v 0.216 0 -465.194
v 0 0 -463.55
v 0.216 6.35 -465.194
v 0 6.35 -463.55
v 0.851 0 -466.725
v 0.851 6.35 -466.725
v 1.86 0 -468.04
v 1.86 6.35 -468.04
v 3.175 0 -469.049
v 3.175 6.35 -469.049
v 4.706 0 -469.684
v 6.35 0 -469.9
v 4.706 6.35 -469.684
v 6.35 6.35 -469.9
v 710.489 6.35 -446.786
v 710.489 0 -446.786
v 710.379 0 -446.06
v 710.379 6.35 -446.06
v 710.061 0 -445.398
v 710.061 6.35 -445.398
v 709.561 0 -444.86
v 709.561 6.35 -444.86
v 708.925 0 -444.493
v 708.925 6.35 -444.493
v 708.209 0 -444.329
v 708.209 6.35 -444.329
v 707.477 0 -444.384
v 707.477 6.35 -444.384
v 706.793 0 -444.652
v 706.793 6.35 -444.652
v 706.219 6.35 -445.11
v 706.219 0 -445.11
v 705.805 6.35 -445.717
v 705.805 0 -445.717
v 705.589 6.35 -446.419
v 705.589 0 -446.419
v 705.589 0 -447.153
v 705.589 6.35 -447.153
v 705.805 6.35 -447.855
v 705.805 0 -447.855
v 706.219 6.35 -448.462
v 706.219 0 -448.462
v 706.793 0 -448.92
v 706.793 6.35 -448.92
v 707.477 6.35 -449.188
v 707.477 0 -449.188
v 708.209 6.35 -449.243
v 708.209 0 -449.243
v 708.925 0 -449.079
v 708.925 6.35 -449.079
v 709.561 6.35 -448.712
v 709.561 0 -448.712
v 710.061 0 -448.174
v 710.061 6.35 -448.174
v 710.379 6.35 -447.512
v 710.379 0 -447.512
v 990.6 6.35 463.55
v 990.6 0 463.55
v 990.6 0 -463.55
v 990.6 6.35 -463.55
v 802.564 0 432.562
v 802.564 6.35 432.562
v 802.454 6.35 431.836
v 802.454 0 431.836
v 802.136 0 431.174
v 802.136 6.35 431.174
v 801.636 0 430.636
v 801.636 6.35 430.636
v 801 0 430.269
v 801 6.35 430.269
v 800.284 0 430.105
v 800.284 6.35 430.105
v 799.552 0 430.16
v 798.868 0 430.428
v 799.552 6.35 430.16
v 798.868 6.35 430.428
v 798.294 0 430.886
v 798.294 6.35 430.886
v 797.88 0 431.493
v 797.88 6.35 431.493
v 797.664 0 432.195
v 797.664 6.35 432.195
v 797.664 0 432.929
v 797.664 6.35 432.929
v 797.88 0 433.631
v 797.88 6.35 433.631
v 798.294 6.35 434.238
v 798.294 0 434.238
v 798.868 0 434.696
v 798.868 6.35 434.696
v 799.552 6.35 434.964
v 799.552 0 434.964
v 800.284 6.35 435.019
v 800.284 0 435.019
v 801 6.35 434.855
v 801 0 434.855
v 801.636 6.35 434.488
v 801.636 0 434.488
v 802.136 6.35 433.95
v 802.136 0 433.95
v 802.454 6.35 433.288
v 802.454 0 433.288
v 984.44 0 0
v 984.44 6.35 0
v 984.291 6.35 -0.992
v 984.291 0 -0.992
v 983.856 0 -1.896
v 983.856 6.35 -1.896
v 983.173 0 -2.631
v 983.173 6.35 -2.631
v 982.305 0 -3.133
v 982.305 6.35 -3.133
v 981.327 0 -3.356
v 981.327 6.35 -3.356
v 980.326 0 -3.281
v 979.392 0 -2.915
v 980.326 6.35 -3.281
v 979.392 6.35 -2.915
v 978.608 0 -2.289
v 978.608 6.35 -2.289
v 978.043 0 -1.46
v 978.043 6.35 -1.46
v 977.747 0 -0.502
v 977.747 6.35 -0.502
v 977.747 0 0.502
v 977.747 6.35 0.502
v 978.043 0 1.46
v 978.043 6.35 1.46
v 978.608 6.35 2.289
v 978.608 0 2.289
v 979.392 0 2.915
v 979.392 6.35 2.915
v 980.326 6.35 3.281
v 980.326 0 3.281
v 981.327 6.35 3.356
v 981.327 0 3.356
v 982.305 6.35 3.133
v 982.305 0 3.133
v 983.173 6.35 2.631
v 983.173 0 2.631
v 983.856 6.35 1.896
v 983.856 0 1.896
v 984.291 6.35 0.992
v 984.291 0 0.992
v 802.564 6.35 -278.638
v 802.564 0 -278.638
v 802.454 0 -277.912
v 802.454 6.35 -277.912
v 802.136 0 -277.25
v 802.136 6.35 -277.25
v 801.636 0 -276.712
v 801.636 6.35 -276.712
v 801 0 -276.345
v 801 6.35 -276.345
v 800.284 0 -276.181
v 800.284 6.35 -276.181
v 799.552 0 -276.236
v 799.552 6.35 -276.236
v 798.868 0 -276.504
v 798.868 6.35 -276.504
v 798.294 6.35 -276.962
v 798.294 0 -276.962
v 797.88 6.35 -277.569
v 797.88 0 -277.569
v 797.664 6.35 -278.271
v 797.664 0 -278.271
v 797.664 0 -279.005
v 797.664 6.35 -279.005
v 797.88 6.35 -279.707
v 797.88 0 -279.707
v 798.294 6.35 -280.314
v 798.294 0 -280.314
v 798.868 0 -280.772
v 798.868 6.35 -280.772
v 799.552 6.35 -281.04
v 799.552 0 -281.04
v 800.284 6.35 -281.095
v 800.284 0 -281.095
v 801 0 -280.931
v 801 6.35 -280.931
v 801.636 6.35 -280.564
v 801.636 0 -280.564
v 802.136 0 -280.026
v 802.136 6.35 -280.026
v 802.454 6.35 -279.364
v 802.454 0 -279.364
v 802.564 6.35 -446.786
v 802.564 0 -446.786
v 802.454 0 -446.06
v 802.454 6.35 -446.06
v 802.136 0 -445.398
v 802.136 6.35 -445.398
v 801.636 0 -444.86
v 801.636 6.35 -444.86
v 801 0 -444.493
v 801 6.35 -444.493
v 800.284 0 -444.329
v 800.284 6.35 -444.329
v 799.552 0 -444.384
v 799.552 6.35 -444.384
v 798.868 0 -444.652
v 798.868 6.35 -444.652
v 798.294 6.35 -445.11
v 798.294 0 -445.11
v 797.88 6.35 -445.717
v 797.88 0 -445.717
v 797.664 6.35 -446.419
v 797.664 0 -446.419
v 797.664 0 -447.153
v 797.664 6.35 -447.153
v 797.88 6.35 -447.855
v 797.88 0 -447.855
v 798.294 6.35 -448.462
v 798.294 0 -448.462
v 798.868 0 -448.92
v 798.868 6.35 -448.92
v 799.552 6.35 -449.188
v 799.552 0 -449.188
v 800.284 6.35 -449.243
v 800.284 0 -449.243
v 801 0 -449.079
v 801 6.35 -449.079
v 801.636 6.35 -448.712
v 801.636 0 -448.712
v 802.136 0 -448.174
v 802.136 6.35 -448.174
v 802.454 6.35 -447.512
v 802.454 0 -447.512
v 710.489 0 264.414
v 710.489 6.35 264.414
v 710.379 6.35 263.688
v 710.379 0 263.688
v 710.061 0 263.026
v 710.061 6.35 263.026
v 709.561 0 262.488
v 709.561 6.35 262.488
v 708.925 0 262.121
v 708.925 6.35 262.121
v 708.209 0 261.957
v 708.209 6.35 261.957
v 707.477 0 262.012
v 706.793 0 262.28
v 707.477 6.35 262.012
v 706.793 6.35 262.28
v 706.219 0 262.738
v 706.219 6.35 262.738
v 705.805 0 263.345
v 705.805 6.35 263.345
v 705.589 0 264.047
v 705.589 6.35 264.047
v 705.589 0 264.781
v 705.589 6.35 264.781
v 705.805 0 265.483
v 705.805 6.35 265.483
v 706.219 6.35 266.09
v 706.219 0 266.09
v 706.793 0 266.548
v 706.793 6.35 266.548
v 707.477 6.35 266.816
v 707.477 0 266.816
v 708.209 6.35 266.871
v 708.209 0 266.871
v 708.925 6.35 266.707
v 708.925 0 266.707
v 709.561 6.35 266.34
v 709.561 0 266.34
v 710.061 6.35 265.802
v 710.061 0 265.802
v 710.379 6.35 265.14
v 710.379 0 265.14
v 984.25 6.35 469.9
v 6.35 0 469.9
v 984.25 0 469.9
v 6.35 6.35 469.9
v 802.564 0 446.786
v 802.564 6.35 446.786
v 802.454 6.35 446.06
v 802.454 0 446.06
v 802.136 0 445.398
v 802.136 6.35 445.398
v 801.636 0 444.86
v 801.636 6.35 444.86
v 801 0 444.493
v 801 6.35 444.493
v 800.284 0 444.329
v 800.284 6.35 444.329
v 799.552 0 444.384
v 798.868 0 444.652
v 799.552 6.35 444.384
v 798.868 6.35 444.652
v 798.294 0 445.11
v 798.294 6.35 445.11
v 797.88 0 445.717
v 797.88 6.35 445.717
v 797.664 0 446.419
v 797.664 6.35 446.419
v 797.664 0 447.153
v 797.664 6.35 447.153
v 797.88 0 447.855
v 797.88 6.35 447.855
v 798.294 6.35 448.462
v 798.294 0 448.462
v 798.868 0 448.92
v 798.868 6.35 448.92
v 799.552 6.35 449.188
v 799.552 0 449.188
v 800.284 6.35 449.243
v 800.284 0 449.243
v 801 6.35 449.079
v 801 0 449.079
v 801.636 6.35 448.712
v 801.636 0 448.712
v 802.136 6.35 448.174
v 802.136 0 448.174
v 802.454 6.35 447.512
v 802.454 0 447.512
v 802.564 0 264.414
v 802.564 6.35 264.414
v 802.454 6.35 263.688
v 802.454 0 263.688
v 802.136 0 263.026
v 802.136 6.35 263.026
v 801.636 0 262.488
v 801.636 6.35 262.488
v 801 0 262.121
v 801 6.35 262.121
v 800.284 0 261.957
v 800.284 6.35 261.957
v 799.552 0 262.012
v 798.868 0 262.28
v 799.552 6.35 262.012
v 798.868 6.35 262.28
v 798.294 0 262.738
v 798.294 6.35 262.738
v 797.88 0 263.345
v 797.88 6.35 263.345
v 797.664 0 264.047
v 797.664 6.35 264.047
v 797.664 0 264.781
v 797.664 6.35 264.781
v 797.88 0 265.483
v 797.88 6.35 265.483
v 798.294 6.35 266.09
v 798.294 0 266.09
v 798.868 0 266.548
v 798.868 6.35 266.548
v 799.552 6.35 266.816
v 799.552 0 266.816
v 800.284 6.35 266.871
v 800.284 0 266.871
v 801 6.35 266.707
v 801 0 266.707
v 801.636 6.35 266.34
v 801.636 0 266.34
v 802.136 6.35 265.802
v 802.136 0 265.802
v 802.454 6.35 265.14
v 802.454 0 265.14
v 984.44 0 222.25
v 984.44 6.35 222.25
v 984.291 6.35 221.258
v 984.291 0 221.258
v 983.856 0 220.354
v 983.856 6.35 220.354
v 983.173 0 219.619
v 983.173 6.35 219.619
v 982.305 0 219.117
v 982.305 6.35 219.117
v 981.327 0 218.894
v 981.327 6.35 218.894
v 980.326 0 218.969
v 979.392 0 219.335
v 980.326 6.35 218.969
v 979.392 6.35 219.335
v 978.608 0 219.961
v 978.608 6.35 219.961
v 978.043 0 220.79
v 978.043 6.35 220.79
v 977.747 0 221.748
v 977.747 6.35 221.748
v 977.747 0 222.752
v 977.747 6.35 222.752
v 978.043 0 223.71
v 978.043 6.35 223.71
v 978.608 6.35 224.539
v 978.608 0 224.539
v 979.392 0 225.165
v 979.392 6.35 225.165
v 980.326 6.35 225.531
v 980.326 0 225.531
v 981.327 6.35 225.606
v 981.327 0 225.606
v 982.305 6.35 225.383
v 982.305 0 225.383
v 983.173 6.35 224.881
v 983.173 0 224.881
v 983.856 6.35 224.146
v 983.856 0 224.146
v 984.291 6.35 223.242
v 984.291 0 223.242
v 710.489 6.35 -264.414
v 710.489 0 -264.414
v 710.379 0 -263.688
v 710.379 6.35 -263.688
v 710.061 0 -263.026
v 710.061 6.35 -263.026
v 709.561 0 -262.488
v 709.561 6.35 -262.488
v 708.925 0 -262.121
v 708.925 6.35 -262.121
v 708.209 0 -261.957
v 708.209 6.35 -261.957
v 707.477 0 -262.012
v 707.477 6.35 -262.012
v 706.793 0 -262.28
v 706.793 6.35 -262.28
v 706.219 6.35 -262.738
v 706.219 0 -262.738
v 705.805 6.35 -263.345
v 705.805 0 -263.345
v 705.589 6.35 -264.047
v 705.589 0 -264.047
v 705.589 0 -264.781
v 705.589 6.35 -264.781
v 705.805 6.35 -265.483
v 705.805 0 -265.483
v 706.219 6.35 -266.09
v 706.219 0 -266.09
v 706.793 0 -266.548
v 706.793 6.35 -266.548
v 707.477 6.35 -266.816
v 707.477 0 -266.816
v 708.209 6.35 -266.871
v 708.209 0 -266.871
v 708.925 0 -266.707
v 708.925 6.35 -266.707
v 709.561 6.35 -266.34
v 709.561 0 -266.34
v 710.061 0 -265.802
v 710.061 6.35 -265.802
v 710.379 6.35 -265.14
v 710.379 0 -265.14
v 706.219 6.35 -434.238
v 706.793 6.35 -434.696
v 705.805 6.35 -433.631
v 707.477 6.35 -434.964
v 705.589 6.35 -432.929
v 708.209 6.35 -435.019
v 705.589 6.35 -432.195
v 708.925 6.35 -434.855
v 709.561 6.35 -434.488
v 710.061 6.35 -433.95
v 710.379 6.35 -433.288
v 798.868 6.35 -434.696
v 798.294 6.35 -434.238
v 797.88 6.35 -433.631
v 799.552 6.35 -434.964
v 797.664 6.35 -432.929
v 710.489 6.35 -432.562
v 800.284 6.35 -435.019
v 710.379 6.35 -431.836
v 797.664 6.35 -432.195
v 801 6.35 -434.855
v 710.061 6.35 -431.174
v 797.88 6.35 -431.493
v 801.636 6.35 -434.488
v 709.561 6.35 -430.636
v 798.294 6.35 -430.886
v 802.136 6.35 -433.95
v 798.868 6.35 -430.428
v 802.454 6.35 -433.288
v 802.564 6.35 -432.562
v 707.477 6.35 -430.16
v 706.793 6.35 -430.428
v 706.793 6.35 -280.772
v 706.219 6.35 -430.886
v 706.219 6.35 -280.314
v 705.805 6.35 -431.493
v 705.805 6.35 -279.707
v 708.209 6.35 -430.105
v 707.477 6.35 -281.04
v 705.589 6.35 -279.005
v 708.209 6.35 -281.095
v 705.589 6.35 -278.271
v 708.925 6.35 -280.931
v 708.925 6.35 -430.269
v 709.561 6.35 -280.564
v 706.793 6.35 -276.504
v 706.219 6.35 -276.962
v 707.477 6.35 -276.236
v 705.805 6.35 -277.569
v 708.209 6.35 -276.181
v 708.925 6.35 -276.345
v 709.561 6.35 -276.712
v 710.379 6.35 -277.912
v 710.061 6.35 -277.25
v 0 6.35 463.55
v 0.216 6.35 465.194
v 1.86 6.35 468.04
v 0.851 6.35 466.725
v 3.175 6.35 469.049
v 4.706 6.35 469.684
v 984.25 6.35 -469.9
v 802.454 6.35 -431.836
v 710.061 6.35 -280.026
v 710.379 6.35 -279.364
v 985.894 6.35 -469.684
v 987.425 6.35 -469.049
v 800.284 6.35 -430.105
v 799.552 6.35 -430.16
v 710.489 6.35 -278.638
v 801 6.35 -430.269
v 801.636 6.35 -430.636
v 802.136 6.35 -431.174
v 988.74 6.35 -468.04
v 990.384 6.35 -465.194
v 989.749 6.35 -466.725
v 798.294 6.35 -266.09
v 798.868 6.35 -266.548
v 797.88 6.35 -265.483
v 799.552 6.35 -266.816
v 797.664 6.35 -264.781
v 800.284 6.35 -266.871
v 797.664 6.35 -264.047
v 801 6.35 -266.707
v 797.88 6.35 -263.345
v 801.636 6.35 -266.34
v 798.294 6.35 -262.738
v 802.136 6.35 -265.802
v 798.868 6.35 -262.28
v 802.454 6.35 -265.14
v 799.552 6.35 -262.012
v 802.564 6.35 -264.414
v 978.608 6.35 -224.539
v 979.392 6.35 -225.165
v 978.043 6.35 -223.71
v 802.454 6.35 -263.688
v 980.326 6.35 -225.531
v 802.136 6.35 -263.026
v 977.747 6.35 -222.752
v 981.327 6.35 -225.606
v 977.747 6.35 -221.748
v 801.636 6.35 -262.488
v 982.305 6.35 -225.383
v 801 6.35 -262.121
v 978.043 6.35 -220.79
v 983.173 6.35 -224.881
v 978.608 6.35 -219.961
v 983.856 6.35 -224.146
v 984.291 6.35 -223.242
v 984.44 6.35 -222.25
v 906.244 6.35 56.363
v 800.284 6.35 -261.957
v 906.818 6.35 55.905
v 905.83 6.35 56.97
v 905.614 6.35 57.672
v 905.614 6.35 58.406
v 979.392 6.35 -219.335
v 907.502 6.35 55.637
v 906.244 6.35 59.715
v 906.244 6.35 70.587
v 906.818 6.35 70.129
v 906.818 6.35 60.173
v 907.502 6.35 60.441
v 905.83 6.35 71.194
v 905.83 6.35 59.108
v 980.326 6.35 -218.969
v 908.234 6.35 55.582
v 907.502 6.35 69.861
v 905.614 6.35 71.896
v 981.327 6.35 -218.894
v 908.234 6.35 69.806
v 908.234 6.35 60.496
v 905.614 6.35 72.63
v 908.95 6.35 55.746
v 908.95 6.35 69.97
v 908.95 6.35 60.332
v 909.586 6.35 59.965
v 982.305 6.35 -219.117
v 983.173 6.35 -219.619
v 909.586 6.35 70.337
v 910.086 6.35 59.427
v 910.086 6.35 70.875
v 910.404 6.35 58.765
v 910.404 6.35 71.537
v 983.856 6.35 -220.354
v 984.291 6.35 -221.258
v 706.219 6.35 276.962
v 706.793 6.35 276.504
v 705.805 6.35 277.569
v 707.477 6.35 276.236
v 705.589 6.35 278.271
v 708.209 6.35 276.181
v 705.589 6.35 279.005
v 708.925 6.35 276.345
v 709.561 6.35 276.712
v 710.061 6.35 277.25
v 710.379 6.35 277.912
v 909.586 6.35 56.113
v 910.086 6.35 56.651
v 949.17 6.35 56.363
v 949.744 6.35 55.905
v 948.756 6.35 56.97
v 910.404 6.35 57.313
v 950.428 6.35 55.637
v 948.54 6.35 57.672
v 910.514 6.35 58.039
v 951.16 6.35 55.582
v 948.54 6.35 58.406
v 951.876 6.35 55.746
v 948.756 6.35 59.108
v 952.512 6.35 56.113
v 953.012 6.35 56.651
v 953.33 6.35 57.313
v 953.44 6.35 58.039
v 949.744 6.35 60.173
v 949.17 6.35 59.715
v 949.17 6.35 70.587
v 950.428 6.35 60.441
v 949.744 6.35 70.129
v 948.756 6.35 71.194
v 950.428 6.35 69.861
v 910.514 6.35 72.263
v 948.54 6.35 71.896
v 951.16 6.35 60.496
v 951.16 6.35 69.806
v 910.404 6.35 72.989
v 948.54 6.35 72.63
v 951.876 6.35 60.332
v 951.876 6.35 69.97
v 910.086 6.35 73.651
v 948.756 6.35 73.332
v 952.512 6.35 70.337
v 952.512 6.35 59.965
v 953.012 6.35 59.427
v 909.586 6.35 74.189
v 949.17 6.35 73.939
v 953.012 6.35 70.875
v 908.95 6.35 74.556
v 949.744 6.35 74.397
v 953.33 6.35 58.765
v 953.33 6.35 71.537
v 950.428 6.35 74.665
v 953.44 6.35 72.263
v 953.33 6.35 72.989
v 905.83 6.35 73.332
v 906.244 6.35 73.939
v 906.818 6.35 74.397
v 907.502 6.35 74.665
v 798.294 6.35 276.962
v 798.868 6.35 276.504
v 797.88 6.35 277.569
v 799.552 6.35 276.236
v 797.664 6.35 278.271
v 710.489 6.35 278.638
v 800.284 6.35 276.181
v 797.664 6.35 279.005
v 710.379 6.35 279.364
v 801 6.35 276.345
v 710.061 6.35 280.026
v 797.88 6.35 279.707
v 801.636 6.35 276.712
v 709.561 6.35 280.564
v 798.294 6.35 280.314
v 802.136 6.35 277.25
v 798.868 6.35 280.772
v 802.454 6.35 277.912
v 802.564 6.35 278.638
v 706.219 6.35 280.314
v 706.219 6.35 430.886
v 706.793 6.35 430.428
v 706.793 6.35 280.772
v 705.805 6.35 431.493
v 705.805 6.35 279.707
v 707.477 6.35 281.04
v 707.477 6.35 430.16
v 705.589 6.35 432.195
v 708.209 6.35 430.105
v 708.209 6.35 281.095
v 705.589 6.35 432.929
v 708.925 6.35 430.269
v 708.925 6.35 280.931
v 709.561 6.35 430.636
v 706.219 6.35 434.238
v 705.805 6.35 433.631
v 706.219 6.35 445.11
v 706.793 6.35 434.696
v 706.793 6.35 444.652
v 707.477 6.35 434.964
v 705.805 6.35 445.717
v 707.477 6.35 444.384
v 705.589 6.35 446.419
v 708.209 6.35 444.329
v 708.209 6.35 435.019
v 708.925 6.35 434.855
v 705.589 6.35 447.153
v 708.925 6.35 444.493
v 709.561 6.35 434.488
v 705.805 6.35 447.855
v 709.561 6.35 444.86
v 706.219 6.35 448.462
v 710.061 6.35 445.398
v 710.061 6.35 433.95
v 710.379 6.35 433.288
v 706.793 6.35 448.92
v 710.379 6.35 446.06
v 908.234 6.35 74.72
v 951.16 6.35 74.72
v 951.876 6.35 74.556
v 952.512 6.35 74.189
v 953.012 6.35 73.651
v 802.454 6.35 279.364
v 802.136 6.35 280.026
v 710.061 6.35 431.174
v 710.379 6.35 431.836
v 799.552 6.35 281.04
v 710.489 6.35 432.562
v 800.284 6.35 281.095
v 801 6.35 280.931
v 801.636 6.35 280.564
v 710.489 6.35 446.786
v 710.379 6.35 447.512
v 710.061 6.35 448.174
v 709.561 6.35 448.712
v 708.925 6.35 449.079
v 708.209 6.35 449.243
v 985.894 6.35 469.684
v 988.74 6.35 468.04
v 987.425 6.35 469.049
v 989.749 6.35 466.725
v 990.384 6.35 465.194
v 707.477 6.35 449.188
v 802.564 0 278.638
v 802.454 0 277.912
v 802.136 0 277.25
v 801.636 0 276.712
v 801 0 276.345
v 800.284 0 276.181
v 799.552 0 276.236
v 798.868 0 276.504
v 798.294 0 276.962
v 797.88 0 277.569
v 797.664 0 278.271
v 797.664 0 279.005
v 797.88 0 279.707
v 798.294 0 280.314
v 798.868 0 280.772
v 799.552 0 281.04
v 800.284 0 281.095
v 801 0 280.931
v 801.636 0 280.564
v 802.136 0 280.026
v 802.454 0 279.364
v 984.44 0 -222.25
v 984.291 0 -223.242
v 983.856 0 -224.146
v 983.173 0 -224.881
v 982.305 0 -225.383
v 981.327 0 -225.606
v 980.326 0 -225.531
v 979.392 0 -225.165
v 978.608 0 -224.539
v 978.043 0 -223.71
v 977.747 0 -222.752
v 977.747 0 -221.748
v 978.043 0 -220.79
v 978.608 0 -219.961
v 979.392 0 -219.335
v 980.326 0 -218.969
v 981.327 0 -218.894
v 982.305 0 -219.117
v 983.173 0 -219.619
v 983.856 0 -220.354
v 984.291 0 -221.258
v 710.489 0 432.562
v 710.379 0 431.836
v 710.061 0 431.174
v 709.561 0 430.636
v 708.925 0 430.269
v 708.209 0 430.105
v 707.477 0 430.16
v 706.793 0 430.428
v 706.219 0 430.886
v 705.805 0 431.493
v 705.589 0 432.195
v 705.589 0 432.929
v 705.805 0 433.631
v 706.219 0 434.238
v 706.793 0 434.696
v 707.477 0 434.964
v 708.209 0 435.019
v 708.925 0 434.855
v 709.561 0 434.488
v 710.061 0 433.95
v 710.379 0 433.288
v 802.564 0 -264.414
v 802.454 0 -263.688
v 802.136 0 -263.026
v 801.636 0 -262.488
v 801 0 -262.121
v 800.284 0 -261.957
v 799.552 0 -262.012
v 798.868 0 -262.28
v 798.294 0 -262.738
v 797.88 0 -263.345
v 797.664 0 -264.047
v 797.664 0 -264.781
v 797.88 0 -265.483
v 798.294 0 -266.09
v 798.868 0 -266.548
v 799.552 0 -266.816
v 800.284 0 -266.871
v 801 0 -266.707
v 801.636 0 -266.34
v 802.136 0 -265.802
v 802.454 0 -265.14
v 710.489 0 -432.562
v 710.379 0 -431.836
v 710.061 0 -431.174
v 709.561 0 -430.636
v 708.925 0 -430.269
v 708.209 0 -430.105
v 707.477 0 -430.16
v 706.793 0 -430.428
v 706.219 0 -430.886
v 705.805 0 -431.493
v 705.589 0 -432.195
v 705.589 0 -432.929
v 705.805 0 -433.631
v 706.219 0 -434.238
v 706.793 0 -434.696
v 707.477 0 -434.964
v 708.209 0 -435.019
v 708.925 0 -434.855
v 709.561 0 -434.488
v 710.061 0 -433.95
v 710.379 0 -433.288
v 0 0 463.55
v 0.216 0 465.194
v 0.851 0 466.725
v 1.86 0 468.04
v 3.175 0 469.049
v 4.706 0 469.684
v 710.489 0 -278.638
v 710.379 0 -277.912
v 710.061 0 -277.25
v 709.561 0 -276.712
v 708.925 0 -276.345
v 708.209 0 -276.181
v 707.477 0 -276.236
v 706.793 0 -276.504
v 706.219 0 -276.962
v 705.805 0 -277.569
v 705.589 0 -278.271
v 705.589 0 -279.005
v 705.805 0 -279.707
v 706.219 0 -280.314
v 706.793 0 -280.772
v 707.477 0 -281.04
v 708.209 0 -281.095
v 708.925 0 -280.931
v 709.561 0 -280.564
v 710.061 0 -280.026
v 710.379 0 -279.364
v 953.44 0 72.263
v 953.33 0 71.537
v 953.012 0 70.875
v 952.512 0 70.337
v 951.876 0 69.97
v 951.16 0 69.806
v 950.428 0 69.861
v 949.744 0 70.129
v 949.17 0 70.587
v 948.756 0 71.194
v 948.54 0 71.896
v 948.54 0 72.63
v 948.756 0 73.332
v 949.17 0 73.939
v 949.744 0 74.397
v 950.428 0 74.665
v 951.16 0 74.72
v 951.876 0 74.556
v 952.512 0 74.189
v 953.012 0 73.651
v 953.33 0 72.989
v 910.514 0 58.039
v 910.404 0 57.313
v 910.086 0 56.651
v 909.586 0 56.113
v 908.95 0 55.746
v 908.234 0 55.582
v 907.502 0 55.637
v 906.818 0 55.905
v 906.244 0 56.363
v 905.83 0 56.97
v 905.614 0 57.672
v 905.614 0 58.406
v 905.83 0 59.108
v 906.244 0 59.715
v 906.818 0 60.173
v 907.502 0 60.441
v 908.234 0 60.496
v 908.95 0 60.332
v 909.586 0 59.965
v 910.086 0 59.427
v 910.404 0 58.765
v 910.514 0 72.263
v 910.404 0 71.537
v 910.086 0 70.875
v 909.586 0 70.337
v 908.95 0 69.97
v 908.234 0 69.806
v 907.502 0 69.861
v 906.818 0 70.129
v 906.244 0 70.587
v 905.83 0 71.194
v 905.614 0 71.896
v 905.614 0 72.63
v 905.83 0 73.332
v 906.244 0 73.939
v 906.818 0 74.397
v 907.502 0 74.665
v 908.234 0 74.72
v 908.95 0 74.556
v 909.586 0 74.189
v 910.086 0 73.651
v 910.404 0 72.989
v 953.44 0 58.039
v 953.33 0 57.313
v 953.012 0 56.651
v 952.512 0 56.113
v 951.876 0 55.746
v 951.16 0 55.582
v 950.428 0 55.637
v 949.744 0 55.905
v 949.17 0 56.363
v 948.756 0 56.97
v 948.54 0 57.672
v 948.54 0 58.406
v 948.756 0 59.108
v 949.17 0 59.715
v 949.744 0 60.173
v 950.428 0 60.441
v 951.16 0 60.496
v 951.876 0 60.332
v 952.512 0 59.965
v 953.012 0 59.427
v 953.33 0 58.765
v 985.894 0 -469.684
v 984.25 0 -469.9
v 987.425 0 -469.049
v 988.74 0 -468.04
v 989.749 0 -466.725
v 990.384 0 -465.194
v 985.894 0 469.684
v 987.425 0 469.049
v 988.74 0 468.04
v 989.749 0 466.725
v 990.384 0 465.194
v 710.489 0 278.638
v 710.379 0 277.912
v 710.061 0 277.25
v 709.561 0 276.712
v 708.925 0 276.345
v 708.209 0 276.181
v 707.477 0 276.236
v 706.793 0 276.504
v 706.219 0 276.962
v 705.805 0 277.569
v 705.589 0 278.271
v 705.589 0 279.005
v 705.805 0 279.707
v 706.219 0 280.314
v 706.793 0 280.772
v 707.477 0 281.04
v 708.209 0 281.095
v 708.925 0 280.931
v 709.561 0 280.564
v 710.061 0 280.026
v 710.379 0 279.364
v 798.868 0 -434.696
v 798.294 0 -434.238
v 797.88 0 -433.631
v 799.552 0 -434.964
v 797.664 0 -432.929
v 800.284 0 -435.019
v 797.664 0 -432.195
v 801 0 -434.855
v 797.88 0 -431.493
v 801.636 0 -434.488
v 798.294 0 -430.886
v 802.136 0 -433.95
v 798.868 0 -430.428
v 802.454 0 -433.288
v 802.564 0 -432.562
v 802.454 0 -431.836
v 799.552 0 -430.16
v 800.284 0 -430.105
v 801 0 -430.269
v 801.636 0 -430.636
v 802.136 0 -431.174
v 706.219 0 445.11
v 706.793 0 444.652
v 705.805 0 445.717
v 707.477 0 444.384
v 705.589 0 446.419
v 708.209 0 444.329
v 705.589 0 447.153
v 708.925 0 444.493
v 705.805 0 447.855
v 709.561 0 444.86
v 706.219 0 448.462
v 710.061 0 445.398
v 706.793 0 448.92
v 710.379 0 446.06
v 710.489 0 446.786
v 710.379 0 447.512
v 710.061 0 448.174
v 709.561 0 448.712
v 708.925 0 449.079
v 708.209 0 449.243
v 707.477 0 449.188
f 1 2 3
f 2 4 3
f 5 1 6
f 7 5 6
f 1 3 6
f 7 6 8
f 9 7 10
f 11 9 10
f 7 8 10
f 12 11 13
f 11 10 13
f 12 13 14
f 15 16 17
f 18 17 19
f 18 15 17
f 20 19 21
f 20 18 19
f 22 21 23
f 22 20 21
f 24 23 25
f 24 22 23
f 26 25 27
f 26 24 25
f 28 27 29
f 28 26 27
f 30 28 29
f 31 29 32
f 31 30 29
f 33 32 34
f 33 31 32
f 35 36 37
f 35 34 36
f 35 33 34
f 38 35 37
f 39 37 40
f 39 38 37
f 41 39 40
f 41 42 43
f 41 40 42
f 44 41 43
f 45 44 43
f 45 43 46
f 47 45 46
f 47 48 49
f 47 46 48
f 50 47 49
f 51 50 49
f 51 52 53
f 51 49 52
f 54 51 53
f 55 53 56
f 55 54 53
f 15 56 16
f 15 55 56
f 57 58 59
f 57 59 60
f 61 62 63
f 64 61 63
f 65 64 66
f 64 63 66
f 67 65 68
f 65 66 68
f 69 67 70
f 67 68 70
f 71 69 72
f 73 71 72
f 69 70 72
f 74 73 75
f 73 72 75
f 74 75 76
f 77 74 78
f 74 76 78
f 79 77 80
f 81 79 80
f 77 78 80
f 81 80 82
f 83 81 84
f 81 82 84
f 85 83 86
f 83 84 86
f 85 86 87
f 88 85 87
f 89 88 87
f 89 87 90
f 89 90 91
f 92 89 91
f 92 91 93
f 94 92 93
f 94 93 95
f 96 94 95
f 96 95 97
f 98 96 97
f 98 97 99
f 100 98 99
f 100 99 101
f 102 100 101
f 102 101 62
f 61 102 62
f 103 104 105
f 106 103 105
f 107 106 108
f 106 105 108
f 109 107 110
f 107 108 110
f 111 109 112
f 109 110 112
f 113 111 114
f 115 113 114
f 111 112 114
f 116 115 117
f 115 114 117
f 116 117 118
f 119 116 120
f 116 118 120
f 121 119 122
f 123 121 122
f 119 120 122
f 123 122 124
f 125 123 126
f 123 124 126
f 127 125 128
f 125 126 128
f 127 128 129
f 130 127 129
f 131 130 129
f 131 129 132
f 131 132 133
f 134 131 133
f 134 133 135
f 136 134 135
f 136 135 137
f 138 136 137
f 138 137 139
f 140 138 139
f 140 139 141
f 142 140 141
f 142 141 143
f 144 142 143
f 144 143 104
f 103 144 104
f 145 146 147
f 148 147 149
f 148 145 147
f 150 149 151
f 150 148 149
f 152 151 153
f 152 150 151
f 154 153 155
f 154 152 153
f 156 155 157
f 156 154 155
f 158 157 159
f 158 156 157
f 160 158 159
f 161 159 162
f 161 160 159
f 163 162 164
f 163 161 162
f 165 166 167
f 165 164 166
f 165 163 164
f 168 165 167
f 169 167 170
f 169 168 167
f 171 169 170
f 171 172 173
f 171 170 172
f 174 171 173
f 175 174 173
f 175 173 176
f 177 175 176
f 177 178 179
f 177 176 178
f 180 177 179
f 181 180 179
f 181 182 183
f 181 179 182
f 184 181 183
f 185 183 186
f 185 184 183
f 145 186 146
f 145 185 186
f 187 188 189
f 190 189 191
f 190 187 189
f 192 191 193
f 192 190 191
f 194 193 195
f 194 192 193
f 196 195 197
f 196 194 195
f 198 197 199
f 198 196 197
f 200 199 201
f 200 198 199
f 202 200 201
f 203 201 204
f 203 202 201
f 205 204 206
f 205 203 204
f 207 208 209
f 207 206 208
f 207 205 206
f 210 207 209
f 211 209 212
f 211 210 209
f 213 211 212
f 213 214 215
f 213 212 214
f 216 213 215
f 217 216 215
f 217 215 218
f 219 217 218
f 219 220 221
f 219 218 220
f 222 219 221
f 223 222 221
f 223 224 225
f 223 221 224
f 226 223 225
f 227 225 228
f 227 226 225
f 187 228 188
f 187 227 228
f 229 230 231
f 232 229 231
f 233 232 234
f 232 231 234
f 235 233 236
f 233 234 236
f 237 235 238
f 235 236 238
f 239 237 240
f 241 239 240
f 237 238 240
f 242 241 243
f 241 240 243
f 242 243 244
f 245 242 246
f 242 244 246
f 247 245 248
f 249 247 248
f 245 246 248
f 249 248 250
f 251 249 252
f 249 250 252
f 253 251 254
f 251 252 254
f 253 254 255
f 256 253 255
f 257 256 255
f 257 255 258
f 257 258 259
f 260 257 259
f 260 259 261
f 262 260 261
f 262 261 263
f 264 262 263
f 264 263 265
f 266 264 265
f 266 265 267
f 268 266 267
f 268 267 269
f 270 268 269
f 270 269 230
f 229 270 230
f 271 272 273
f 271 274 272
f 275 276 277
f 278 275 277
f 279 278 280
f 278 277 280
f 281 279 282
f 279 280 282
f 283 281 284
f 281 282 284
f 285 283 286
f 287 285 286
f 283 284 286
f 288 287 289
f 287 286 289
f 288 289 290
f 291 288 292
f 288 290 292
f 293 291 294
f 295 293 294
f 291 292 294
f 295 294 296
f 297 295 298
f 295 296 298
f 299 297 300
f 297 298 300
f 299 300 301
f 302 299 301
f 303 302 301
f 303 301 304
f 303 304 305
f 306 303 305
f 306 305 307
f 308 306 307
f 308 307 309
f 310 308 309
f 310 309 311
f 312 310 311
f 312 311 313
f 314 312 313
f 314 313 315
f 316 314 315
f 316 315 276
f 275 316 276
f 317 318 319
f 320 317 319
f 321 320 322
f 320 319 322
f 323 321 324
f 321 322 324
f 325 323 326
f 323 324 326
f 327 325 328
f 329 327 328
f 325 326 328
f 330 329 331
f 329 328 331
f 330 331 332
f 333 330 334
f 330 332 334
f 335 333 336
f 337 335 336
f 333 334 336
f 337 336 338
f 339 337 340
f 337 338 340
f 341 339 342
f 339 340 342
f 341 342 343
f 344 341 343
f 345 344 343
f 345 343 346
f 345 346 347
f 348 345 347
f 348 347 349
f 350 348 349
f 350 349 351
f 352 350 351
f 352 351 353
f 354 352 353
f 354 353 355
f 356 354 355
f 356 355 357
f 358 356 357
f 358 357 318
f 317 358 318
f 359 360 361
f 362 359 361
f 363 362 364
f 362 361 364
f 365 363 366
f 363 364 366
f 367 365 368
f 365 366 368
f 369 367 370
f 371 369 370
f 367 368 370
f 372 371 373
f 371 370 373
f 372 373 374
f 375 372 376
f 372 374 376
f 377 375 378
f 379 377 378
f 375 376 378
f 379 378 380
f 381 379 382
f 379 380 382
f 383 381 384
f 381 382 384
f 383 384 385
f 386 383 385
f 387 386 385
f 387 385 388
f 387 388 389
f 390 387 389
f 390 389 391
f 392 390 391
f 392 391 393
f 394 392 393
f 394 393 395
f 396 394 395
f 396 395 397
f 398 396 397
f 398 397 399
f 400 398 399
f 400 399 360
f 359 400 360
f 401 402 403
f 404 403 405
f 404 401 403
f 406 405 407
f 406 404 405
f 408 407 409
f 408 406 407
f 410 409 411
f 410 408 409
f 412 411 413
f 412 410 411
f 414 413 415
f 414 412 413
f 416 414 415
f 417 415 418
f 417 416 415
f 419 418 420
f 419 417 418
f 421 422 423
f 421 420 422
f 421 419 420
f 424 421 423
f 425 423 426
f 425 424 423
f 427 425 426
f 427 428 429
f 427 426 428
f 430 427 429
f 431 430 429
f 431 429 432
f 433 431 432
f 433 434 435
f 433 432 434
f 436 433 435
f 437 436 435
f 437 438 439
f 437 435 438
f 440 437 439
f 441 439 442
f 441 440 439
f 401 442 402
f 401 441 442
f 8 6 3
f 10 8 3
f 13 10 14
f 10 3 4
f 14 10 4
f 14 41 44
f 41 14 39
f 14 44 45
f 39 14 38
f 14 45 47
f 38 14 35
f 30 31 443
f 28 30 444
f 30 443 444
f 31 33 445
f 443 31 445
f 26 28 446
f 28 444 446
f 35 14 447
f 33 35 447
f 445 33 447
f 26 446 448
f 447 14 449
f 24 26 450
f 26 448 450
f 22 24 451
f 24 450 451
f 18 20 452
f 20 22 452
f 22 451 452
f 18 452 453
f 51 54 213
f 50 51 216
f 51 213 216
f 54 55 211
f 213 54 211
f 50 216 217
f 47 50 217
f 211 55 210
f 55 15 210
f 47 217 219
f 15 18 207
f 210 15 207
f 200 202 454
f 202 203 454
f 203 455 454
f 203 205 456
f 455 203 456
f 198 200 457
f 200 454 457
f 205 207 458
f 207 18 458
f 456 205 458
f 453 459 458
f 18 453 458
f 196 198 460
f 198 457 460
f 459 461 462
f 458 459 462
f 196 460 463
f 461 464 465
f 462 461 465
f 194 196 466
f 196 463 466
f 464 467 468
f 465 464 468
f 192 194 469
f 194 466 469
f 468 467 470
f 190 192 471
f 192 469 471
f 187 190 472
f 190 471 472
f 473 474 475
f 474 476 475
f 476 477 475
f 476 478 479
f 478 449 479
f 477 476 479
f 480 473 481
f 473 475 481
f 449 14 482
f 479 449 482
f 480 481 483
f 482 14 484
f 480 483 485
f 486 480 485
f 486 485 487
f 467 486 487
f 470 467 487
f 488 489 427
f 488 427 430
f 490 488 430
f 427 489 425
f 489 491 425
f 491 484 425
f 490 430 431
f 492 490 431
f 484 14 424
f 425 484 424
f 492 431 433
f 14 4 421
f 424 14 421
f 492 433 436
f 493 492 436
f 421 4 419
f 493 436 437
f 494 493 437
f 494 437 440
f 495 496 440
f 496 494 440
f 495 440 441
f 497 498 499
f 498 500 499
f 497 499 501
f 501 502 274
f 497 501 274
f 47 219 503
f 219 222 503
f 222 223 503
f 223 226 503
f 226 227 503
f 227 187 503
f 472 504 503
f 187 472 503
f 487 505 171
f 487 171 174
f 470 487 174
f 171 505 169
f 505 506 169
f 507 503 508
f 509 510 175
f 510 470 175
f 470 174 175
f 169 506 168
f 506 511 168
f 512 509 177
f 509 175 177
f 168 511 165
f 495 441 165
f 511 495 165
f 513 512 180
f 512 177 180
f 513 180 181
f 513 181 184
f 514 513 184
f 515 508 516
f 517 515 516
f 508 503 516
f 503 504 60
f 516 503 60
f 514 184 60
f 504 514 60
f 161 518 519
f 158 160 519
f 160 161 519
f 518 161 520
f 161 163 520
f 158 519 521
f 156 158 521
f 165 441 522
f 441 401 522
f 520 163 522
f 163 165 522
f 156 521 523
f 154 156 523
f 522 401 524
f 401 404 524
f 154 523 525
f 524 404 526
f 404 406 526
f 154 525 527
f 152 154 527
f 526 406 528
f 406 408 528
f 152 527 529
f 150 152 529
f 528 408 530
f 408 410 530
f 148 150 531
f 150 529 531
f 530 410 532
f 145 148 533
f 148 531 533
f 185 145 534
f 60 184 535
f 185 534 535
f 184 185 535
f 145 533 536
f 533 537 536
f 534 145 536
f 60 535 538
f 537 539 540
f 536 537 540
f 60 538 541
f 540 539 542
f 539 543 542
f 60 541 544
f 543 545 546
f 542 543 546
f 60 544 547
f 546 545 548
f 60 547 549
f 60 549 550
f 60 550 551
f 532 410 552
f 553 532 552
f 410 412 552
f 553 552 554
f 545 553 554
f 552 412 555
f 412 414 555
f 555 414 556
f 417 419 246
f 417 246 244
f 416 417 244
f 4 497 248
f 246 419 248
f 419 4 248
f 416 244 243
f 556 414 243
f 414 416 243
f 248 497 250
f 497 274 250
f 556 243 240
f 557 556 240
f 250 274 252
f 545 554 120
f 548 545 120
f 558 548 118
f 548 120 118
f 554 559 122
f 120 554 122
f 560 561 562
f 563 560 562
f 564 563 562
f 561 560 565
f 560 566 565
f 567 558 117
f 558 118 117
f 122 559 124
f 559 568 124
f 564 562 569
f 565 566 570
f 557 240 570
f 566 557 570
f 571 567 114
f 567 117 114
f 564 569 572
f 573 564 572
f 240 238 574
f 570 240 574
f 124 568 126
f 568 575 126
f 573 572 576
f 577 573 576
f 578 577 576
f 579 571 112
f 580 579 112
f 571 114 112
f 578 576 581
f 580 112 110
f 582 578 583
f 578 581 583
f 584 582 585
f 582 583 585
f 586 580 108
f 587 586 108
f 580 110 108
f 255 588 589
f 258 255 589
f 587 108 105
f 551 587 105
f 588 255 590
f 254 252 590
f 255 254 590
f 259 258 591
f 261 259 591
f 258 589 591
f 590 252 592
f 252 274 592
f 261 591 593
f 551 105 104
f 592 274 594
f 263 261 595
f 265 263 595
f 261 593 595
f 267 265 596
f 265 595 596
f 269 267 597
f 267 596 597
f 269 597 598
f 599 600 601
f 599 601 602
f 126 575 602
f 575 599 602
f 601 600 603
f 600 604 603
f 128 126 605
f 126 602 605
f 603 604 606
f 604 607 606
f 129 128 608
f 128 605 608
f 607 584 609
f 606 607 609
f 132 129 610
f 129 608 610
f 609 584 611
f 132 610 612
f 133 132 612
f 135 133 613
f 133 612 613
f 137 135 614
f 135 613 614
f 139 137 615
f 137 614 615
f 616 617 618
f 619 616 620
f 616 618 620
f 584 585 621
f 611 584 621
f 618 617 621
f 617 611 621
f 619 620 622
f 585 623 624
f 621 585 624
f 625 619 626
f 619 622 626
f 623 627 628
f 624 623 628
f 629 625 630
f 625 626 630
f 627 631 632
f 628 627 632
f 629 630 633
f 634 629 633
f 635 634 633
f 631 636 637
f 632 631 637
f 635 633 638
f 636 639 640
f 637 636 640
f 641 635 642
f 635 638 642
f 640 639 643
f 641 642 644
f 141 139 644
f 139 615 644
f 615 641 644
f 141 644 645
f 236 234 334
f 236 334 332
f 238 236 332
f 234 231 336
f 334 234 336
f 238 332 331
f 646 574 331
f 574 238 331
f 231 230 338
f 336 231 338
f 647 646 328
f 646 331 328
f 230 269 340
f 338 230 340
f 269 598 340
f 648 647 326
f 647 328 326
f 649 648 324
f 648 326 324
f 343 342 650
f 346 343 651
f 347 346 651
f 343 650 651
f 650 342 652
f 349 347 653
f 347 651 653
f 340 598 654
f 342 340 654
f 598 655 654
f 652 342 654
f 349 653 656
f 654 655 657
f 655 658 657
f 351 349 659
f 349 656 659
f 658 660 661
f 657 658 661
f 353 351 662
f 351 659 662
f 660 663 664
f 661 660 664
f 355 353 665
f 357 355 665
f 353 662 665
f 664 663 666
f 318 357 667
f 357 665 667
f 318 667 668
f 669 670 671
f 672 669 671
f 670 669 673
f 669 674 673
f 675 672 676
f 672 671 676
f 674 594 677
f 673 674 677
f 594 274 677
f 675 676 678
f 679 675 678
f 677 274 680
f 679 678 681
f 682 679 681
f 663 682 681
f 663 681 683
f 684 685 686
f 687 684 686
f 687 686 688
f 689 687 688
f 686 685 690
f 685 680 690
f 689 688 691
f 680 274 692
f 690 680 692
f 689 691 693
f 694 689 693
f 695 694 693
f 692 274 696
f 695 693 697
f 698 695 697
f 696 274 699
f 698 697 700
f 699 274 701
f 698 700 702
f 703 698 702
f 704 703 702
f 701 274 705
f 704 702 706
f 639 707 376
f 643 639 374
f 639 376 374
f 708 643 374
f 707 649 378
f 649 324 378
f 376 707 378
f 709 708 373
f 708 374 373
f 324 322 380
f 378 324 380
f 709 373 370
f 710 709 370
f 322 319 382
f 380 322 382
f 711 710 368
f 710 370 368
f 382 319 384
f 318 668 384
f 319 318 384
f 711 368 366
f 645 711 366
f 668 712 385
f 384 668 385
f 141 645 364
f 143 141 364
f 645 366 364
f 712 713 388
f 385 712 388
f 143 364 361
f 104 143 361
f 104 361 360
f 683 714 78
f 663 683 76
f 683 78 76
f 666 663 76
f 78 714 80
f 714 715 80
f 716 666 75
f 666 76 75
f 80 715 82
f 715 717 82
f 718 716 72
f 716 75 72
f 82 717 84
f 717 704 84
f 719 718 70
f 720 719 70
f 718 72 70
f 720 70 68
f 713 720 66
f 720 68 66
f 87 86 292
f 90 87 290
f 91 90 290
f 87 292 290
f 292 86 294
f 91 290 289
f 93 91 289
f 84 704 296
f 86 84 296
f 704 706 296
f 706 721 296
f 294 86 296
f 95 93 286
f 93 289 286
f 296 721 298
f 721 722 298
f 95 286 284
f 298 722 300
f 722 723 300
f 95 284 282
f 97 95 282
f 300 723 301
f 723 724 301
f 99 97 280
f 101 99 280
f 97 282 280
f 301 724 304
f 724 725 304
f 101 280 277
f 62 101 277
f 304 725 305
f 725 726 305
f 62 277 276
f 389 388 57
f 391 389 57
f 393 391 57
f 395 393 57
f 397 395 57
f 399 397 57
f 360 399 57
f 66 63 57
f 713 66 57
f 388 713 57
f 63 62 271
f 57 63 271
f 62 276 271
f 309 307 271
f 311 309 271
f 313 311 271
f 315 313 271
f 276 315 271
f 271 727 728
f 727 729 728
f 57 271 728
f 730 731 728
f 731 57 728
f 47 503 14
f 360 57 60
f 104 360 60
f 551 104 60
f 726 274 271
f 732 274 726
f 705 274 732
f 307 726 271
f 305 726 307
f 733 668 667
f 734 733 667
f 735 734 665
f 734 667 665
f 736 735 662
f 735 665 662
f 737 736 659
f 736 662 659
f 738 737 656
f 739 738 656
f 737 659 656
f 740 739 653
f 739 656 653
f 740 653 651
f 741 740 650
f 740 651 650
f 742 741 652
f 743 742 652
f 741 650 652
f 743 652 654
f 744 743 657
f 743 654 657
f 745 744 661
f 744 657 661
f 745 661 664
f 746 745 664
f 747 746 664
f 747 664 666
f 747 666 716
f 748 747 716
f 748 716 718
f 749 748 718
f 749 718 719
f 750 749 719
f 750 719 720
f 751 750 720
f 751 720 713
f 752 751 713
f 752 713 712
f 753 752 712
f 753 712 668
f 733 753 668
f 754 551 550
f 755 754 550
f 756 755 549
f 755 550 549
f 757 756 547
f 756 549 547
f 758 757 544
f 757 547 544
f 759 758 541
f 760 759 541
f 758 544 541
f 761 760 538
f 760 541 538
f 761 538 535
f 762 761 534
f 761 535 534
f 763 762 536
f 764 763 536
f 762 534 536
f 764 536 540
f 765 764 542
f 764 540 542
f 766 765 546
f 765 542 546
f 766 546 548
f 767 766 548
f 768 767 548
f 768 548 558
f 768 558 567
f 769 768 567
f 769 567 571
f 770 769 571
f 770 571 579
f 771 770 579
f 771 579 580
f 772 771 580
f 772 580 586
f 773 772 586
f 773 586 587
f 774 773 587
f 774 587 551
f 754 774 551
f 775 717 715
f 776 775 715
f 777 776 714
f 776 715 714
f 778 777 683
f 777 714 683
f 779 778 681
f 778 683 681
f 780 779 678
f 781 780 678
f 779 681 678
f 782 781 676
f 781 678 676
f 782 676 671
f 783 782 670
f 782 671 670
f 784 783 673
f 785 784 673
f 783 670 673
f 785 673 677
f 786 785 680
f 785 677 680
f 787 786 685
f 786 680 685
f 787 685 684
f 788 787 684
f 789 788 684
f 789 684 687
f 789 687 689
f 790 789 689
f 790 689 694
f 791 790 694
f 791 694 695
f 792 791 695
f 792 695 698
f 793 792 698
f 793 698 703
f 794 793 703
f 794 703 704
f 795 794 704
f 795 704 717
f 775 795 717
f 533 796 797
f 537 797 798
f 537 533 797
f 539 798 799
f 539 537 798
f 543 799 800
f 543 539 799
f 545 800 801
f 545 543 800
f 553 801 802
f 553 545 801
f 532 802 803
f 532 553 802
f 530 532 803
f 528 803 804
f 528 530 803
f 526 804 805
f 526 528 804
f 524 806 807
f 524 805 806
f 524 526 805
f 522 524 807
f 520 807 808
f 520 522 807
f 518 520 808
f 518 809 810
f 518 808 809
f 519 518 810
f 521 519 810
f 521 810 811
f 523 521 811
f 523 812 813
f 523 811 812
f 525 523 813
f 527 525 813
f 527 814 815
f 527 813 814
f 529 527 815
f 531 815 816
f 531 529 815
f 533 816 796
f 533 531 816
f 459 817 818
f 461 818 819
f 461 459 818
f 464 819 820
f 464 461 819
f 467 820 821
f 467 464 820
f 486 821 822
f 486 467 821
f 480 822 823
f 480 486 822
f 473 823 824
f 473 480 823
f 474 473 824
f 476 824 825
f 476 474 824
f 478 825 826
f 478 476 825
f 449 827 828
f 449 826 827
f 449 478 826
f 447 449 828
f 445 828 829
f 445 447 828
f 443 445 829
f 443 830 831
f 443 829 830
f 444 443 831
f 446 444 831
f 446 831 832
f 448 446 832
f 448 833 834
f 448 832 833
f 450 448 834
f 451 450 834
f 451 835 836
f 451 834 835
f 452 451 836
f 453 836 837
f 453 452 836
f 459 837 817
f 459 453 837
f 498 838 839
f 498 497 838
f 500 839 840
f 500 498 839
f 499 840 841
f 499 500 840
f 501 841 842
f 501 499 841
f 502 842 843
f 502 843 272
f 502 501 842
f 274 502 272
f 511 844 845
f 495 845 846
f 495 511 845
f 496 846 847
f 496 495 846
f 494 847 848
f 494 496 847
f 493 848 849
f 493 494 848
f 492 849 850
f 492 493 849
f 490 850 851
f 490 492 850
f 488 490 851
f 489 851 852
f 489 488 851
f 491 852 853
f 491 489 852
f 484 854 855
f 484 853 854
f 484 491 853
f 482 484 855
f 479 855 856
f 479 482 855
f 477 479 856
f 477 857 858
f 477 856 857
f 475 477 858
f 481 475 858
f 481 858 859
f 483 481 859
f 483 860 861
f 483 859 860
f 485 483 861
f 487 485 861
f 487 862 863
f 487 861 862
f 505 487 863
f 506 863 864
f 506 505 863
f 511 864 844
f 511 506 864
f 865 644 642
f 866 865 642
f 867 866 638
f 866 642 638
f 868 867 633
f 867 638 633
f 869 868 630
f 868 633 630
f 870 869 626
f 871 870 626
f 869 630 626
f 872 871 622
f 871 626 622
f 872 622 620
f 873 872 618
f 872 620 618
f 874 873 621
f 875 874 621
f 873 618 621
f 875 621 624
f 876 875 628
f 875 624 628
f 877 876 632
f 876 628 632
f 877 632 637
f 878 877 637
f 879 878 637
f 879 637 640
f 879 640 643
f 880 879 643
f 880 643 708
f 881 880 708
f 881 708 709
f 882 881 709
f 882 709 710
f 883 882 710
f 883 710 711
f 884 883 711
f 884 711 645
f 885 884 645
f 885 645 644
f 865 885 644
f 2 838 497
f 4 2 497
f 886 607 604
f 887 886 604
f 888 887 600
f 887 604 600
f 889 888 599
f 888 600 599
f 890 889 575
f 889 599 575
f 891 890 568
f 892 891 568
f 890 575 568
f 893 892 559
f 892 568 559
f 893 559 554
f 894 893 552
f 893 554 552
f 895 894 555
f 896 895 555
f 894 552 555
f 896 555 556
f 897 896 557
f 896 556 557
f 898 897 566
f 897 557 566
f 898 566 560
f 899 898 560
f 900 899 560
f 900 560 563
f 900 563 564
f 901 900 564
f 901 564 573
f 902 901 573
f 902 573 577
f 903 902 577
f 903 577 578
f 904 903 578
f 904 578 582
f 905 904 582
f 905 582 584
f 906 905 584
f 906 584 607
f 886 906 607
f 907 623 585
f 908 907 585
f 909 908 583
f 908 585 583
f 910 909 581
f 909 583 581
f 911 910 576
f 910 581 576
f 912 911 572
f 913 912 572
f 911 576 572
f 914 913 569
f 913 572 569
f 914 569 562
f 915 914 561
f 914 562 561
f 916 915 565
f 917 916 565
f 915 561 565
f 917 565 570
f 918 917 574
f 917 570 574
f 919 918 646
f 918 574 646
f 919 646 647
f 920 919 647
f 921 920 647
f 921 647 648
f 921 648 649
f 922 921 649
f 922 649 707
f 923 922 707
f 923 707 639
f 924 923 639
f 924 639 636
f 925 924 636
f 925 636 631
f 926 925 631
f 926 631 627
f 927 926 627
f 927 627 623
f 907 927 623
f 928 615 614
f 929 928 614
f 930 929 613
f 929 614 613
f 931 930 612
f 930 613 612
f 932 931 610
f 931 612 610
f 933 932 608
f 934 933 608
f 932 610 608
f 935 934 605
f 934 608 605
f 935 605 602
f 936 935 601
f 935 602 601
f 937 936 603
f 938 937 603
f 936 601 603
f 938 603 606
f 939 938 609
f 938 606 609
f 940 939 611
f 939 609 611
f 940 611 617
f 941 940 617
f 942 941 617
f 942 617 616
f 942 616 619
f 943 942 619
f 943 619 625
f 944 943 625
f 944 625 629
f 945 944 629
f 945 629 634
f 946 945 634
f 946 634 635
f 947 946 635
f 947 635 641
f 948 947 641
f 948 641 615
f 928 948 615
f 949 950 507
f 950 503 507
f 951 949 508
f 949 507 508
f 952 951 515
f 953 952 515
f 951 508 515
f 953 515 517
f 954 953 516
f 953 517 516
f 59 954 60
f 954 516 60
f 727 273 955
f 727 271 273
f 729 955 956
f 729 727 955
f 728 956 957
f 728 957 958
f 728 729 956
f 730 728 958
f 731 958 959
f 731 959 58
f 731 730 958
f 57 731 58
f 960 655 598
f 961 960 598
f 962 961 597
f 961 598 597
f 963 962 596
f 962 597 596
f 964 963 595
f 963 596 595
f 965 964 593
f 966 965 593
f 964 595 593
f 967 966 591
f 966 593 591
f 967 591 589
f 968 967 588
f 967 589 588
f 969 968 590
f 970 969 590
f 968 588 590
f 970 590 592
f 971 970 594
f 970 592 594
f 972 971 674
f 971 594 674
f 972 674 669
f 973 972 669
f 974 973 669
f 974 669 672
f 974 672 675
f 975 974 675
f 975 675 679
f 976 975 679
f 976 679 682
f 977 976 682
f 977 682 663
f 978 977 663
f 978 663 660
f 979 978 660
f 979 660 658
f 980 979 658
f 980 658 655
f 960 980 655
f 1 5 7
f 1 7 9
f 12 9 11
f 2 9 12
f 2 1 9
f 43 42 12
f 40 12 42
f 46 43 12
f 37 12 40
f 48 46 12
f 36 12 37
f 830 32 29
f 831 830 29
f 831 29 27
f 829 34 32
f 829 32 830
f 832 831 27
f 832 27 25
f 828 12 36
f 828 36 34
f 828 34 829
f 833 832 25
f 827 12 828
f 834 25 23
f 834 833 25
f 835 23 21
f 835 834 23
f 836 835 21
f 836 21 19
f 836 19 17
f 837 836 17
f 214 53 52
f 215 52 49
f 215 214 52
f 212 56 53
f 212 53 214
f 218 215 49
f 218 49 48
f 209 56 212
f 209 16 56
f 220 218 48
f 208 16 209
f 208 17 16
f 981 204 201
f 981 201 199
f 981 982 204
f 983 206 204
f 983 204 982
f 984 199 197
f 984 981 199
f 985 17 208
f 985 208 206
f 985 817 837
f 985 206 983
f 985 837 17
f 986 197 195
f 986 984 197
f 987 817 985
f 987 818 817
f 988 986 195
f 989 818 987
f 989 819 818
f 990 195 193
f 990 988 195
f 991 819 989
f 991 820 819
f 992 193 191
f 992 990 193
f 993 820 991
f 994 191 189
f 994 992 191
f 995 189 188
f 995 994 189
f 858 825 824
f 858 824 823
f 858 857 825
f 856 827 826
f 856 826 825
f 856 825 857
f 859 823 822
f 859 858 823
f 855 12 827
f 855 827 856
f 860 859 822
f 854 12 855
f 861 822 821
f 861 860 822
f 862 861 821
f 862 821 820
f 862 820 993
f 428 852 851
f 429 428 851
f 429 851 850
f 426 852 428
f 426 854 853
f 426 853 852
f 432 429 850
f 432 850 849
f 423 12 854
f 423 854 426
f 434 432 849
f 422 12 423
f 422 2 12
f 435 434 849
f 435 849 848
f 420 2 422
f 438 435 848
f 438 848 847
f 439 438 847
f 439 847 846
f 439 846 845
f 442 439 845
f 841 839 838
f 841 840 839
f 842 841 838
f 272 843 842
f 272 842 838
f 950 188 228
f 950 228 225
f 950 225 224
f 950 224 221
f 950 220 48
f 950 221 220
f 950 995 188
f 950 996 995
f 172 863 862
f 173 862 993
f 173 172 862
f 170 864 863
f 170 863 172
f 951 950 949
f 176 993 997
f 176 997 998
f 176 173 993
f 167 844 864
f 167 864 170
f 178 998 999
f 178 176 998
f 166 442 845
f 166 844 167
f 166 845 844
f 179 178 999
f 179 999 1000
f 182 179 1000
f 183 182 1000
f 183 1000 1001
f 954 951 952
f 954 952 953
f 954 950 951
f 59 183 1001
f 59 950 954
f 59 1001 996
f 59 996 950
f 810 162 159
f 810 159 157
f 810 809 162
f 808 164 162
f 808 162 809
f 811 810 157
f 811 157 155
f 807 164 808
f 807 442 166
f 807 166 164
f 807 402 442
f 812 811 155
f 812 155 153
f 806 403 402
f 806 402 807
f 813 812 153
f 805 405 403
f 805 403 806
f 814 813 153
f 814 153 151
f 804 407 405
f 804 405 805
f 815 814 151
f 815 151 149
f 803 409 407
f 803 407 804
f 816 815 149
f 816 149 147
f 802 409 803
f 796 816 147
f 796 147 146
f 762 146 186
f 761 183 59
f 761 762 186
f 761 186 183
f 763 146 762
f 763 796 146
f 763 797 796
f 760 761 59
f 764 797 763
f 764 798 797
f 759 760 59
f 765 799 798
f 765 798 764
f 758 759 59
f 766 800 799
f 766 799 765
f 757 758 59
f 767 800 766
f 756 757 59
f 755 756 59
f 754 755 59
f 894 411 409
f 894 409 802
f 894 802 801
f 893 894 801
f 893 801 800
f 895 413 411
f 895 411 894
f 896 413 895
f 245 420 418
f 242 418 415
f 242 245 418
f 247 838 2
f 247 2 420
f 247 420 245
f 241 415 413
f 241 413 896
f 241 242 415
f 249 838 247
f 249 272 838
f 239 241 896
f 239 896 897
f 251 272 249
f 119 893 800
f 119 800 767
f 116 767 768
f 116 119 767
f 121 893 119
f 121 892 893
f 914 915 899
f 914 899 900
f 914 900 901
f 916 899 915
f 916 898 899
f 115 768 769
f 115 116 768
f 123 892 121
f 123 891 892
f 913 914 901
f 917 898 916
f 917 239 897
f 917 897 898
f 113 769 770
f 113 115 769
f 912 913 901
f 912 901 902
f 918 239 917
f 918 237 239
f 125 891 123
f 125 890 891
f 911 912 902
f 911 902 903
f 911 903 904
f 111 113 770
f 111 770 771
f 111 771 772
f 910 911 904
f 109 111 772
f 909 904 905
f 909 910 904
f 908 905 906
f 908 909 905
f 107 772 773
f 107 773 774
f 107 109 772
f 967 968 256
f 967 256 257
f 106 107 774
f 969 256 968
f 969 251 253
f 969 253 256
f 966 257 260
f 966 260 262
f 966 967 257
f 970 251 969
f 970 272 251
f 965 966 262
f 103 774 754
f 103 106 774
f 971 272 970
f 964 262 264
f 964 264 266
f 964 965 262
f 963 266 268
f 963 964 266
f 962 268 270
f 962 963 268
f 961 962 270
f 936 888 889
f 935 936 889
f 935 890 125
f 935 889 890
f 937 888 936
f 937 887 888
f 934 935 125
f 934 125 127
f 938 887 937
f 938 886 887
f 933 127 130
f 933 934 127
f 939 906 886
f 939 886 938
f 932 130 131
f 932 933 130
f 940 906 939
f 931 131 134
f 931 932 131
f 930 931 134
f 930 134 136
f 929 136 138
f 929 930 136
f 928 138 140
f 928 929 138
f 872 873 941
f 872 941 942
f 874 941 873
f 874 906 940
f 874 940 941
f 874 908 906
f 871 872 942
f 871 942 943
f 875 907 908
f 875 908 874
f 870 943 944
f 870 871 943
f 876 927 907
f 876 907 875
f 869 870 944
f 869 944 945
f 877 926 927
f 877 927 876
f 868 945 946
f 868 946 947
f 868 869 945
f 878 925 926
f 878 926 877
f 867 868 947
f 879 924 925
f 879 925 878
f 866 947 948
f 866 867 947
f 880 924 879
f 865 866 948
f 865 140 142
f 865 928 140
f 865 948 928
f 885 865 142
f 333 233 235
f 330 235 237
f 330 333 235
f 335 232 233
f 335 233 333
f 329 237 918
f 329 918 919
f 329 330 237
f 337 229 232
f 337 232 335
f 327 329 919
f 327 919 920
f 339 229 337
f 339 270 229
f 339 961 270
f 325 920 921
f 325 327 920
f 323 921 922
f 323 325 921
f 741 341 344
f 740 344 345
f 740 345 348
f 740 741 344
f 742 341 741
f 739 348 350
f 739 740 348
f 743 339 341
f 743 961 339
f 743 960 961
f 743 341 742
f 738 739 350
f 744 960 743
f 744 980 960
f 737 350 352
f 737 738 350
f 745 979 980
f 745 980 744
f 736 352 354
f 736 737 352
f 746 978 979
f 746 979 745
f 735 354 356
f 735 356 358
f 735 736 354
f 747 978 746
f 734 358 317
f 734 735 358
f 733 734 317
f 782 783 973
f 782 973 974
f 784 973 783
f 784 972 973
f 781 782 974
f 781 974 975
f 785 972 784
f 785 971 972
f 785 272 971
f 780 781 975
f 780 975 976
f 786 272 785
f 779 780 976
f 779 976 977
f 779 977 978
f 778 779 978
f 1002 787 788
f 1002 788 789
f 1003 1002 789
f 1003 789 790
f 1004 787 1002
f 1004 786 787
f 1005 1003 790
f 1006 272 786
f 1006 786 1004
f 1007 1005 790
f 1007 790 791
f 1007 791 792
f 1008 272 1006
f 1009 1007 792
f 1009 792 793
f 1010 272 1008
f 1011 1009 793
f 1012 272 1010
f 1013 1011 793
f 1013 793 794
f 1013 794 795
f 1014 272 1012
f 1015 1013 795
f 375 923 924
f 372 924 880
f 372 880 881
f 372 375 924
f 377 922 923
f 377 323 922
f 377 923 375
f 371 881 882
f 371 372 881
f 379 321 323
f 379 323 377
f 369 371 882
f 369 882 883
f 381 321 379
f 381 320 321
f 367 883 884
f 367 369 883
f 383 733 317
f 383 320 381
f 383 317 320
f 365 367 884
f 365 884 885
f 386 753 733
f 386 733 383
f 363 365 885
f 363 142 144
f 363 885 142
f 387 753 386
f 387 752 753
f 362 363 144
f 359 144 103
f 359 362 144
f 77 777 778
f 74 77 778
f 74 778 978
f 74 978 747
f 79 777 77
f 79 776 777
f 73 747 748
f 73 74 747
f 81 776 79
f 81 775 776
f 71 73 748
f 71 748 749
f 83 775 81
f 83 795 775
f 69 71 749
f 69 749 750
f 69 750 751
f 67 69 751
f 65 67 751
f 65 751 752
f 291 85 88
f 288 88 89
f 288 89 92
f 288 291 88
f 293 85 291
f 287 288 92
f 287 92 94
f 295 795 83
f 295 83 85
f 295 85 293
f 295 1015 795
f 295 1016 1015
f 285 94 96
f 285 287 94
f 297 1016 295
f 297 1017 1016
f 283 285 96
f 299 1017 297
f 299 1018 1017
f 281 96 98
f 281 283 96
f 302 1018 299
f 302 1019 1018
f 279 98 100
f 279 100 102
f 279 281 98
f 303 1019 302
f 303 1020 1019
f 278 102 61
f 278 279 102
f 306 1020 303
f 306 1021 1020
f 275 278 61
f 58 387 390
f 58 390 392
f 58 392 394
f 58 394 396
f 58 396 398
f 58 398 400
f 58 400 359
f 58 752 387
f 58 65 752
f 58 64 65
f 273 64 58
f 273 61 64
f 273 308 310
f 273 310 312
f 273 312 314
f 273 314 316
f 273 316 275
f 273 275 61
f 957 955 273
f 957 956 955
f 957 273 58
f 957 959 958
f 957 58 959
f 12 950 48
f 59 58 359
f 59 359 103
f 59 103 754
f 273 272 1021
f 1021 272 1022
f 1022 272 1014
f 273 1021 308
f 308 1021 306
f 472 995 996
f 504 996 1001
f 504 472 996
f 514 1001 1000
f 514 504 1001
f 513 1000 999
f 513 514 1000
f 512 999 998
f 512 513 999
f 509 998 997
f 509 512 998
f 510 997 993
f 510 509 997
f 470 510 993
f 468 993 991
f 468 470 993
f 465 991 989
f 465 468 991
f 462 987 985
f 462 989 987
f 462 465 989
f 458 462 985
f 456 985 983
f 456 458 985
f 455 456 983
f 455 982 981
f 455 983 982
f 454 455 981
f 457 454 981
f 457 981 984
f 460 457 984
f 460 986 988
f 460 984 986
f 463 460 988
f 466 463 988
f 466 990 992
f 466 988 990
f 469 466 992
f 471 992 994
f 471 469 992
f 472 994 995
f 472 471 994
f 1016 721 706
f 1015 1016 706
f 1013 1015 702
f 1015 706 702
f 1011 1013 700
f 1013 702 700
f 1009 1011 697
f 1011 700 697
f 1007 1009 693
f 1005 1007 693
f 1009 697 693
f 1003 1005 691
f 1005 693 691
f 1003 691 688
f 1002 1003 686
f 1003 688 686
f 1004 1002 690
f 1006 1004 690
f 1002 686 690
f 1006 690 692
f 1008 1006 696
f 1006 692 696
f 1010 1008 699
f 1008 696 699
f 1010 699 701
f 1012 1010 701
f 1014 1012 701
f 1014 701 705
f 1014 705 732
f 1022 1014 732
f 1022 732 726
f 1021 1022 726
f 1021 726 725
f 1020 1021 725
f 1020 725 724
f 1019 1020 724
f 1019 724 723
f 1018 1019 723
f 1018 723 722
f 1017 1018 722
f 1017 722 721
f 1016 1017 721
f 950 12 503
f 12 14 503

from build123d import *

# Parameters (mm, degrees)
SKETCH1_W           = 990.6
SKETCH1_H           = 6.35
BOSS_EXTRUDE1_DEPTH = 469.9
SKETCH2_R           = 2.4638
CUT_EXTRUDE1_DEPTH  = 7.35
SKETCH3_R           = 2.4638
CUT_EXTRUDE2_DEPTH  = 7.35
SKETCH4_R           = 3.3655
CUT_EXTRUDE3_DEPTH  = 7.35
FILLET1_R           = 6.35


with BuildPart() as part:
    # Sketch1 → Boss-Extrude1 (new body, symmetric)
    with BuildSketch(Plane.XY):
        with Locations((495.3, 3.175)):
            Rectangle(SKETCH1_W, SKETCH1_H)
    extrude(amount=BOSS_EXTRUDE1_DEPTH, both=True)

    # Sketch2 → Cut-Extrude1 (cut, through all)
    with BuildSketch(Plane(origin=(0, 6.35, 0), x_dir=(1, 0, 0), z_dir=(0, 1, 0))):
        with Locations((908.05, -72.263)):
            Circle(SKETCH2_R)
        with Locations((908.05, -58.039)):
            Circle(SKETCH2_R)
        with Locations((950.976, -72.263)):
            Circle(SKETCH2_R)
        with Locations((950.976, -58.039)):
            Circle(SKETCH2_R)
    extrude(amount=-CUT_EXTRUDE1_DEPTH, mode=Mode.SUBTRACT)

    # Sketch3 → Cut-Extrude2 (cut, through all)
    with BuildSketch(Plane(origin=(0, 6.35, 0), x_dir=(1, 0, 0), z_dir=(0, 1, 0))):
        with Locations((800.1, -446.786)):
            Circle(SKETCH3_R)
        with Locations((708.025, -446.786)):
            Circle(SKETCH3_R)
        with Locations((708.025, -432.562)):
            Circle(SKETCH3_R)
        with Locations((800.1, -432.562)):
            Circle(SKETCH3_R)
        with Locations((708.025, -264.414)):
            Circle(SKETCH3_R)
        with Locations((708.025, -278.638)):
            Circle(SKETCH3_R)
        with Locations((800.1, -264.414)):
            Circle(SKETCH3_R)
        with Locations((800.1, -278.638)):
            Circle(SKETCH3_R)
    cut_extrude2 = extrude(amount=-CUT_EXTRUDE2_DEPTH, mode=Mode.SUBTRACT)

    # Mirror1: Cut-Extrude2 across plane
    add(cut_extrude2.mirror(Plane.XY), mode=Mode.SUBTRACT)

    # Sketch4 → Cut-Extrude3 (cut, through all)
    with BuildSketch(Plane(origin=(0, 6.35, 0), x_dir=(1, 0, 0), z_dir=(0, 1, 0))):
        with Locations((981.075, 0)):
            Circle(SKETCH4_R)
        with Locations((981.075, 222.25)):
            Circle(SKETCH4_R)
        with Locations((981.075, -222.25)):
            Circle(SKETCH4_R)
    extrude(amount=-CUT_EXTRUDE3_DEPTH, mode=Mode.SUBTRACT)

    # Fillet1
    fillet1_edges = [part.edges().sort_by_distance(p)[0] for p in [
        (0, 3.175, 469.9),
        (0, 3.175, -469.9),
        (990.6, 3.175, -469.9),
        (990.6, 3.175, 469.9),
    ]]
    fillet(fillet1_edges, radius=FILLET1_R)


solid = part.part
